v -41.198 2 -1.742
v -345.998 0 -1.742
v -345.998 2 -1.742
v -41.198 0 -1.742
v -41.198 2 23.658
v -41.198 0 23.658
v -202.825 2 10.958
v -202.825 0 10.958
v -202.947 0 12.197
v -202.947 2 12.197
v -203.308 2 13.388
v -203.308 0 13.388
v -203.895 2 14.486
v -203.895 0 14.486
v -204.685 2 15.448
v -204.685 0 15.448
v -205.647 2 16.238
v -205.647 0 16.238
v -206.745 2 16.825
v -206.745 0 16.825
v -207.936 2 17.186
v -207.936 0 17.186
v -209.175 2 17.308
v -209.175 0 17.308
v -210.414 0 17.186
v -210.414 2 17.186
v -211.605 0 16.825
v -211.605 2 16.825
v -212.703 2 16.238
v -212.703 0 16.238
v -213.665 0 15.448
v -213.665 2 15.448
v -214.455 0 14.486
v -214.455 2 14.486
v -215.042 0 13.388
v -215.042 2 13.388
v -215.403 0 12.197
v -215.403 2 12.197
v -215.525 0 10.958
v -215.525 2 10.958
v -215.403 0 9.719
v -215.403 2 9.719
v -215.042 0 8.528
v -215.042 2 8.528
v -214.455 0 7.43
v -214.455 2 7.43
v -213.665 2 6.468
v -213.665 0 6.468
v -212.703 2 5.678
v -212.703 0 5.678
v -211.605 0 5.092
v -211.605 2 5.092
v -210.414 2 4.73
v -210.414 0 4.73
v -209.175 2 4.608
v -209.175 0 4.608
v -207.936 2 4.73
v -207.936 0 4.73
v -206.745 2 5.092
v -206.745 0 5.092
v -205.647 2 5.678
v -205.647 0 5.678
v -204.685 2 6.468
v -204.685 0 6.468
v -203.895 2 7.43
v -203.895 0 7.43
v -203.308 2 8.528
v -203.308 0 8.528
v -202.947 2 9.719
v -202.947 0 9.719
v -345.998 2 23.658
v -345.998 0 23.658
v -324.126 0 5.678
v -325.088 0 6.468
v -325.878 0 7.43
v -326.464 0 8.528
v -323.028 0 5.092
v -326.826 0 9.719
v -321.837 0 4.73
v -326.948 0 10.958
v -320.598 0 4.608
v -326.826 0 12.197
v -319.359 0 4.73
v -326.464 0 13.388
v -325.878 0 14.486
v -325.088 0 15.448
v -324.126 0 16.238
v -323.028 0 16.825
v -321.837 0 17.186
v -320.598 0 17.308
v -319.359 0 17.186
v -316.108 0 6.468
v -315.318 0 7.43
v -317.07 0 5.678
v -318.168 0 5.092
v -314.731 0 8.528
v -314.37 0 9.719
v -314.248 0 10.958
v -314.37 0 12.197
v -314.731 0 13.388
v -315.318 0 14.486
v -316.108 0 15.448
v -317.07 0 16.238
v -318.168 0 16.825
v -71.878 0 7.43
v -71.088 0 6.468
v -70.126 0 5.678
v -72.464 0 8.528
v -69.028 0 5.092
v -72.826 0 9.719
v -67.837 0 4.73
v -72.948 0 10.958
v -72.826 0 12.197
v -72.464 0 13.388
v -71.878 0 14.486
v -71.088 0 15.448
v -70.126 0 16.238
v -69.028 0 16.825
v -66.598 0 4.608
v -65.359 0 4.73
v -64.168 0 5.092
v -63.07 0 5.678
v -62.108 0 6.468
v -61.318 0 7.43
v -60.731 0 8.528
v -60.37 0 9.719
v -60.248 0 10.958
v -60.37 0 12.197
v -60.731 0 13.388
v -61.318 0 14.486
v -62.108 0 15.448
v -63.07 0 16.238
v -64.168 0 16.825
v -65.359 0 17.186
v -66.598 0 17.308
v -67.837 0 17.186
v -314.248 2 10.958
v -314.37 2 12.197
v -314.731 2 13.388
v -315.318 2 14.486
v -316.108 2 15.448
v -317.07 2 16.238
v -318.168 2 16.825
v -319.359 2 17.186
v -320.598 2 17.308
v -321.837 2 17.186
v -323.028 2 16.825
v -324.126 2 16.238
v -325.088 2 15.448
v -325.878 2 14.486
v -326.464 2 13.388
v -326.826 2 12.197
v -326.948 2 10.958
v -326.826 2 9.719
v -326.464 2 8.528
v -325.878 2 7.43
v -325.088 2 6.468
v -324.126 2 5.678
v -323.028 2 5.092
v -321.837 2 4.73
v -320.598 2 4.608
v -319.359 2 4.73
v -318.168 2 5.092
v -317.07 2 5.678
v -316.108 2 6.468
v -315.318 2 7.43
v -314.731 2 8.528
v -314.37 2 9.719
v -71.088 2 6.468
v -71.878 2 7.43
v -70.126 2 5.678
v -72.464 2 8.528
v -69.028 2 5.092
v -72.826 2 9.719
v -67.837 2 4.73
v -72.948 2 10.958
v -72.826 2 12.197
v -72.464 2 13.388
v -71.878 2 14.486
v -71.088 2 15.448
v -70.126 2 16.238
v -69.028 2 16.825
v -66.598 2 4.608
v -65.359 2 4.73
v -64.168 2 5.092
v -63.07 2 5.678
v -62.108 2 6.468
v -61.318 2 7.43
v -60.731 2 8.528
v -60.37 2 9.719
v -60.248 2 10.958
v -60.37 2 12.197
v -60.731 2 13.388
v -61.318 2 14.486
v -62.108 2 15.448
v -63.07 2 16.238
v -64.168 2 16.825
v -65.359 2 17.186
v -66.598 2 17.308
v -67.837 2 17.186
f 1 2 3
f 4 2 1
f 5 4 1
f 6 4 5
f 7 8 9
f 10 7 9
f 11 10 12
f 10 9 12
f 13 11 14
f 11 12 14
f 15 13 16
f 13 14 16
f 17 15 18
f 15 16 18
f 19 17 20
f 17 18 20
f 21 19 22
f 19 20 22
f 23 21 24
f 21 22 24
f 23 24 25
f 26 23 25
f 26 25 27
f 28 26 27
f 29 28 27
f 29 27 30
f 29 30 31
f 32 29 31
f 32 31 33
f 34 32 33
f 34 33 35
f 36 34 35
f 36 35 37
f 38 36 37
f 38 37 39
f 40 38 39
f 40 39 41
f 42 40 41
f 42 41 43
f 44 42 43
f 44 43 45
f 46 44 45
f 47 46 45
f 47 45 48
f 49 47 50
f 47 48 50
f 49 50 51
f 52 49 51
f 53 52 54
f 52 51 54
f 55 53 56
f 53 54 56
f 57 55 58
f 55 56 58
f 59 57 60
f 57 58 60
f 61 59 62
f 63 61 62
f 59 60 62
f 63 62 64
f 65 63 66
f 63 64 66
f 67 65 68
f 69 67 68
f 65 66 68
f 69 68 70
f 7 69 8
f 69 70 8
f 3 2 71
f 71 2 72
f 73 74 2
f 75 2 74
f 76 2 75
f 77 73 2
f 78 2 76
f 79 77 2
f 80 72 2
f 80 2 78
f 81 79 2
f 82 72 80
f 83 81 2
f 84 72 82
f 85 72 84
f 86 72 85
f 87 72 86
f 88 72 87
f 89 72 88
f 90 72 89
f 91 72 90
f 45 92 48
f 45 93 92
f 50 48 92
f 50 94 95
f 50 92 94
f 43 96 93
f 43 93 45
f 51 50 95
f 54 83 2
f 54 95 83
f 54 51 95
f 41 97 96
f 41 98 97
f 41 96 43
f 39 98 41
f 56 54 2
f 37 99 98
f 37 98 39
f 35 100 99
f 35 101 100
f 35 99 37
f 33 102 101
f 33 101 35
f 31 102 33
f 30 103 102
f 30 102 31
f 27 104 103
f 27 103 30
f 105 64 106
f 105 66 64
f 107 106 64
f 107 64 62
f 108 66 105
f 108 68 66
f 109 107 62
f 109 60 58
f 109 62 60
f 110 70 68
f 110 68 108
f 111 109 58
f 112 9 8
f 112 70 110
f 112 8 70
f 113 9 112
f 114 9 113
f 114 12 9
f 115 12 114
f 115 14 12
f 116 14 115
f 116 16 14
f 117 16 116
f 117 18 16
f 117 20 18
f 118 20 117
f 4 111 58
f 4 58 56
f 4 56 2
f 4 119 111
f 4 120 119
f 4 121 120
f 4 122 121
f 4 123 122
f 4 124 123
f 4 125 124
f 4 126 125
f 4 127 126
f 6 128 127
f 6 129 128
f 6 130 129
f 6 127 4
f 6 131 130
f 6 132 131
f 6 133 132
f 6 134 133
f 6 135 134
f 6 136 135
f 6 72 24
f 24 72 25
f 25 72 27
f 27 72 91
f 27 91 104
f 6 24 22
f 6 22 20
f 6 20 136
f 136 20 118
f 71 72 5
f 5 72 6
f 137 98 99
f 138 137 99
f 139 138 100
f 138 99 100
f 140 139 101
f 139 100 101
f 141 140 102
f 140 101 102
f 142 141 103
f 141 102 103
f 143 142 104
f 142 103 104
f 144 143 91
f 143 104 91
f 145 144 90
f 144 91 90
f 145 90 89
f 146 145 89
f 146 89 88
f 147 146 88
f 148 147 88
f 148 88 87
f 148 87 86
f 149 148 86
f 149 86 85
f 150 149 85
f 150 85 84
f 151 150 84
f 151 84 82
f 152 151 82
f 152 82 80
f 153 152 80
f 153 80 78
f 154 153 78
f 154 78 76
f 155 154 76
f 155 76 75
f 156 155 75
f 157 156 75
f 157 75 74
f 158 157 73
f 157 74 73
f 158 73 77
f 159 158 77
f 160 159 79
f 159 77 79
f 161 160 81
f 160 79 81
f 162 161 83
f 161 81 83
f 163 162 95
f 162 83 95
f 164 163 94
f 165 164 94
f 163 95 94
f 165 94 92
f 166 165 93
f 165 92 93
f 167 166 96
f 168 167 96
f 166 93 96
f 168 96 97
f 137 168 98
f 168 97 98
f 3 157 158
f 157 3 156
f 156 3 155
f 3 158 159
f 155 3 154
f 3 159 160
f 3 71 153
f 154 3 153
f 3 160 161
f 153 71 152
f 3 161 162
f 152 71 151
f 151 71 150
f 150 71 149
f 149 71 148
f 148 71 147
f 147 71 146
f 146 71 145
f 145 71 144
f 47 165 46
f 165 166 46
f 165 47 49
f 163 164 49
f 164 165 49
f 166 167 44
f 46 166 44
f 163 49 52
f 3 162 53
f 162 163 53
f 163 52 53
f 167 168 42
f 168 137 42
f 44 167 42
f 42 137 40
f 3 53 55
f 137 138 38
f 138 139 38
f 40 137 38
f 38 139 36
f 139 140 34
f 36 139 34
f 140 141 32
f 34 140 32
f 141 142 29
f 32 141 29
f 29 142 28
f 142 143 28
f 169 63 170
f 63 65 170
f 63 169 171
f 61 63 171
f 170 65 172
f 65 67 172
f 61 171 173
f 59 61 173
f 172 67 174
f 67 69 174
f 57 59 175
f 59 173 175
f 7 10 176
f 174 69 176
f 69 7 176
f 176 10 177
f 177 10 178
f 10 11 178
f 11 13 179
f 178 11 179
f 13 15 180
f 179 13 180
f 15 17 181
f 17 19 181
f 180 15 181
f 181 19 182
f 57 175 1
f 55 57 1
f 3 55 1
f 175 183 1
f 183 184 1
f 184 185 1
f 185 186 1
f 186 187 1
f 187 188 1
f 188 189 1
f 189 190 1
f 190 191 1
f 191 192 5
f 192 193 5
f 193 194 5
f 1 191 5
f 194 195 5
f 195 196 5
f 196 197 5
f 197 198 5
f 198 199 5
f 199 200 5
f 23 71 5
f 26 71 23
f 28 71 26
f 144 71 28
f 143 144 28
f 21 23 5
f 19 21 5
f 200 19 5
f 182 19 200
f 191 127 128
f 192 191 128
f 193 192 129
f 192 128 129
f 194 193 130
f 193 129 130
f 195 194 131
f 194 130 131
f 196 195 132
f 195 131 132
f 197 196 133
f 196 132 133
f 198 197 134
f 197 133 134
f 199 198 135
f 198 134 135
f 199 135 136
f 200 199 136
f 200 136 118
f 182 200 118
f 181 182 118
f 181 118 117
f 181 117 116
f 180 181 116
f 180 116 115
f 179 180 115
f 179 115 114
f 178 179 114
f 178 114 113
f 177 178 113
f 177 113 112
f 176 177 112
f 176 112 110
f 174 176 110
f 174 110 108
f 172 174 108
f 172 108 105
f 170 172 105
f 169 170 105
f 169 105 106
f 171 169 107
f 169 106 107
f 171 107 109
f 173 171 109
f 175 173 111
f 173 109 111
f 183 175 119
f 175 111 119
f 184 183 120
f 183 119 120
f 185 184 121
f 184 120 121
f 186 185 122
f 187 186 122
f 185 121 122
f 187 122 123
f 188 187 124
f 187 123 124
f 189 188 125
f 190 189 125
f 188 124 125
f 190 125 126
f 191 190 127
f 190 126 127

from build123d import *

# Parameters (mm, degrees)
F0_W     = 304.8
F0_H     = 25.4
F2_DEPTH = 2
F1_R     = 6.35
F3_DEPTH = 108
F4_R     = 6.35
F5_DEPTH = 25.4


with BuildPart() as f2:
    # F0 (on Front) → F2 (new body)
    with BuildSketch(Plane.XZ):
        with Locations((-193.59771, 10.958225)):
            Rectangle(F0_W, F0_H)
    extrude(amount=-F2_DEPTH)

    # F1 (on face) → F3 (cut)
    with BuildSketch(Plane.XZ):
        with Locations((-209.174946, 10.958225)):
            Circle(F1_R)
    extrude(amount=-F3_DEPTH, mode=Mode.SUBTRACT)

    # F4 (on face) → F5 (cut)
    with BuildSketch(Plane.XZ):
        with Locations((-320.59771, 10.958225)):
            Circle(F4_R)
        with Locations((-66.59771, 10.958225)):
            Circle(F4_R)
    extrude(amount=-F5_DEPTH, mode=Mode.SUBTRACT)


solid = f2.part
